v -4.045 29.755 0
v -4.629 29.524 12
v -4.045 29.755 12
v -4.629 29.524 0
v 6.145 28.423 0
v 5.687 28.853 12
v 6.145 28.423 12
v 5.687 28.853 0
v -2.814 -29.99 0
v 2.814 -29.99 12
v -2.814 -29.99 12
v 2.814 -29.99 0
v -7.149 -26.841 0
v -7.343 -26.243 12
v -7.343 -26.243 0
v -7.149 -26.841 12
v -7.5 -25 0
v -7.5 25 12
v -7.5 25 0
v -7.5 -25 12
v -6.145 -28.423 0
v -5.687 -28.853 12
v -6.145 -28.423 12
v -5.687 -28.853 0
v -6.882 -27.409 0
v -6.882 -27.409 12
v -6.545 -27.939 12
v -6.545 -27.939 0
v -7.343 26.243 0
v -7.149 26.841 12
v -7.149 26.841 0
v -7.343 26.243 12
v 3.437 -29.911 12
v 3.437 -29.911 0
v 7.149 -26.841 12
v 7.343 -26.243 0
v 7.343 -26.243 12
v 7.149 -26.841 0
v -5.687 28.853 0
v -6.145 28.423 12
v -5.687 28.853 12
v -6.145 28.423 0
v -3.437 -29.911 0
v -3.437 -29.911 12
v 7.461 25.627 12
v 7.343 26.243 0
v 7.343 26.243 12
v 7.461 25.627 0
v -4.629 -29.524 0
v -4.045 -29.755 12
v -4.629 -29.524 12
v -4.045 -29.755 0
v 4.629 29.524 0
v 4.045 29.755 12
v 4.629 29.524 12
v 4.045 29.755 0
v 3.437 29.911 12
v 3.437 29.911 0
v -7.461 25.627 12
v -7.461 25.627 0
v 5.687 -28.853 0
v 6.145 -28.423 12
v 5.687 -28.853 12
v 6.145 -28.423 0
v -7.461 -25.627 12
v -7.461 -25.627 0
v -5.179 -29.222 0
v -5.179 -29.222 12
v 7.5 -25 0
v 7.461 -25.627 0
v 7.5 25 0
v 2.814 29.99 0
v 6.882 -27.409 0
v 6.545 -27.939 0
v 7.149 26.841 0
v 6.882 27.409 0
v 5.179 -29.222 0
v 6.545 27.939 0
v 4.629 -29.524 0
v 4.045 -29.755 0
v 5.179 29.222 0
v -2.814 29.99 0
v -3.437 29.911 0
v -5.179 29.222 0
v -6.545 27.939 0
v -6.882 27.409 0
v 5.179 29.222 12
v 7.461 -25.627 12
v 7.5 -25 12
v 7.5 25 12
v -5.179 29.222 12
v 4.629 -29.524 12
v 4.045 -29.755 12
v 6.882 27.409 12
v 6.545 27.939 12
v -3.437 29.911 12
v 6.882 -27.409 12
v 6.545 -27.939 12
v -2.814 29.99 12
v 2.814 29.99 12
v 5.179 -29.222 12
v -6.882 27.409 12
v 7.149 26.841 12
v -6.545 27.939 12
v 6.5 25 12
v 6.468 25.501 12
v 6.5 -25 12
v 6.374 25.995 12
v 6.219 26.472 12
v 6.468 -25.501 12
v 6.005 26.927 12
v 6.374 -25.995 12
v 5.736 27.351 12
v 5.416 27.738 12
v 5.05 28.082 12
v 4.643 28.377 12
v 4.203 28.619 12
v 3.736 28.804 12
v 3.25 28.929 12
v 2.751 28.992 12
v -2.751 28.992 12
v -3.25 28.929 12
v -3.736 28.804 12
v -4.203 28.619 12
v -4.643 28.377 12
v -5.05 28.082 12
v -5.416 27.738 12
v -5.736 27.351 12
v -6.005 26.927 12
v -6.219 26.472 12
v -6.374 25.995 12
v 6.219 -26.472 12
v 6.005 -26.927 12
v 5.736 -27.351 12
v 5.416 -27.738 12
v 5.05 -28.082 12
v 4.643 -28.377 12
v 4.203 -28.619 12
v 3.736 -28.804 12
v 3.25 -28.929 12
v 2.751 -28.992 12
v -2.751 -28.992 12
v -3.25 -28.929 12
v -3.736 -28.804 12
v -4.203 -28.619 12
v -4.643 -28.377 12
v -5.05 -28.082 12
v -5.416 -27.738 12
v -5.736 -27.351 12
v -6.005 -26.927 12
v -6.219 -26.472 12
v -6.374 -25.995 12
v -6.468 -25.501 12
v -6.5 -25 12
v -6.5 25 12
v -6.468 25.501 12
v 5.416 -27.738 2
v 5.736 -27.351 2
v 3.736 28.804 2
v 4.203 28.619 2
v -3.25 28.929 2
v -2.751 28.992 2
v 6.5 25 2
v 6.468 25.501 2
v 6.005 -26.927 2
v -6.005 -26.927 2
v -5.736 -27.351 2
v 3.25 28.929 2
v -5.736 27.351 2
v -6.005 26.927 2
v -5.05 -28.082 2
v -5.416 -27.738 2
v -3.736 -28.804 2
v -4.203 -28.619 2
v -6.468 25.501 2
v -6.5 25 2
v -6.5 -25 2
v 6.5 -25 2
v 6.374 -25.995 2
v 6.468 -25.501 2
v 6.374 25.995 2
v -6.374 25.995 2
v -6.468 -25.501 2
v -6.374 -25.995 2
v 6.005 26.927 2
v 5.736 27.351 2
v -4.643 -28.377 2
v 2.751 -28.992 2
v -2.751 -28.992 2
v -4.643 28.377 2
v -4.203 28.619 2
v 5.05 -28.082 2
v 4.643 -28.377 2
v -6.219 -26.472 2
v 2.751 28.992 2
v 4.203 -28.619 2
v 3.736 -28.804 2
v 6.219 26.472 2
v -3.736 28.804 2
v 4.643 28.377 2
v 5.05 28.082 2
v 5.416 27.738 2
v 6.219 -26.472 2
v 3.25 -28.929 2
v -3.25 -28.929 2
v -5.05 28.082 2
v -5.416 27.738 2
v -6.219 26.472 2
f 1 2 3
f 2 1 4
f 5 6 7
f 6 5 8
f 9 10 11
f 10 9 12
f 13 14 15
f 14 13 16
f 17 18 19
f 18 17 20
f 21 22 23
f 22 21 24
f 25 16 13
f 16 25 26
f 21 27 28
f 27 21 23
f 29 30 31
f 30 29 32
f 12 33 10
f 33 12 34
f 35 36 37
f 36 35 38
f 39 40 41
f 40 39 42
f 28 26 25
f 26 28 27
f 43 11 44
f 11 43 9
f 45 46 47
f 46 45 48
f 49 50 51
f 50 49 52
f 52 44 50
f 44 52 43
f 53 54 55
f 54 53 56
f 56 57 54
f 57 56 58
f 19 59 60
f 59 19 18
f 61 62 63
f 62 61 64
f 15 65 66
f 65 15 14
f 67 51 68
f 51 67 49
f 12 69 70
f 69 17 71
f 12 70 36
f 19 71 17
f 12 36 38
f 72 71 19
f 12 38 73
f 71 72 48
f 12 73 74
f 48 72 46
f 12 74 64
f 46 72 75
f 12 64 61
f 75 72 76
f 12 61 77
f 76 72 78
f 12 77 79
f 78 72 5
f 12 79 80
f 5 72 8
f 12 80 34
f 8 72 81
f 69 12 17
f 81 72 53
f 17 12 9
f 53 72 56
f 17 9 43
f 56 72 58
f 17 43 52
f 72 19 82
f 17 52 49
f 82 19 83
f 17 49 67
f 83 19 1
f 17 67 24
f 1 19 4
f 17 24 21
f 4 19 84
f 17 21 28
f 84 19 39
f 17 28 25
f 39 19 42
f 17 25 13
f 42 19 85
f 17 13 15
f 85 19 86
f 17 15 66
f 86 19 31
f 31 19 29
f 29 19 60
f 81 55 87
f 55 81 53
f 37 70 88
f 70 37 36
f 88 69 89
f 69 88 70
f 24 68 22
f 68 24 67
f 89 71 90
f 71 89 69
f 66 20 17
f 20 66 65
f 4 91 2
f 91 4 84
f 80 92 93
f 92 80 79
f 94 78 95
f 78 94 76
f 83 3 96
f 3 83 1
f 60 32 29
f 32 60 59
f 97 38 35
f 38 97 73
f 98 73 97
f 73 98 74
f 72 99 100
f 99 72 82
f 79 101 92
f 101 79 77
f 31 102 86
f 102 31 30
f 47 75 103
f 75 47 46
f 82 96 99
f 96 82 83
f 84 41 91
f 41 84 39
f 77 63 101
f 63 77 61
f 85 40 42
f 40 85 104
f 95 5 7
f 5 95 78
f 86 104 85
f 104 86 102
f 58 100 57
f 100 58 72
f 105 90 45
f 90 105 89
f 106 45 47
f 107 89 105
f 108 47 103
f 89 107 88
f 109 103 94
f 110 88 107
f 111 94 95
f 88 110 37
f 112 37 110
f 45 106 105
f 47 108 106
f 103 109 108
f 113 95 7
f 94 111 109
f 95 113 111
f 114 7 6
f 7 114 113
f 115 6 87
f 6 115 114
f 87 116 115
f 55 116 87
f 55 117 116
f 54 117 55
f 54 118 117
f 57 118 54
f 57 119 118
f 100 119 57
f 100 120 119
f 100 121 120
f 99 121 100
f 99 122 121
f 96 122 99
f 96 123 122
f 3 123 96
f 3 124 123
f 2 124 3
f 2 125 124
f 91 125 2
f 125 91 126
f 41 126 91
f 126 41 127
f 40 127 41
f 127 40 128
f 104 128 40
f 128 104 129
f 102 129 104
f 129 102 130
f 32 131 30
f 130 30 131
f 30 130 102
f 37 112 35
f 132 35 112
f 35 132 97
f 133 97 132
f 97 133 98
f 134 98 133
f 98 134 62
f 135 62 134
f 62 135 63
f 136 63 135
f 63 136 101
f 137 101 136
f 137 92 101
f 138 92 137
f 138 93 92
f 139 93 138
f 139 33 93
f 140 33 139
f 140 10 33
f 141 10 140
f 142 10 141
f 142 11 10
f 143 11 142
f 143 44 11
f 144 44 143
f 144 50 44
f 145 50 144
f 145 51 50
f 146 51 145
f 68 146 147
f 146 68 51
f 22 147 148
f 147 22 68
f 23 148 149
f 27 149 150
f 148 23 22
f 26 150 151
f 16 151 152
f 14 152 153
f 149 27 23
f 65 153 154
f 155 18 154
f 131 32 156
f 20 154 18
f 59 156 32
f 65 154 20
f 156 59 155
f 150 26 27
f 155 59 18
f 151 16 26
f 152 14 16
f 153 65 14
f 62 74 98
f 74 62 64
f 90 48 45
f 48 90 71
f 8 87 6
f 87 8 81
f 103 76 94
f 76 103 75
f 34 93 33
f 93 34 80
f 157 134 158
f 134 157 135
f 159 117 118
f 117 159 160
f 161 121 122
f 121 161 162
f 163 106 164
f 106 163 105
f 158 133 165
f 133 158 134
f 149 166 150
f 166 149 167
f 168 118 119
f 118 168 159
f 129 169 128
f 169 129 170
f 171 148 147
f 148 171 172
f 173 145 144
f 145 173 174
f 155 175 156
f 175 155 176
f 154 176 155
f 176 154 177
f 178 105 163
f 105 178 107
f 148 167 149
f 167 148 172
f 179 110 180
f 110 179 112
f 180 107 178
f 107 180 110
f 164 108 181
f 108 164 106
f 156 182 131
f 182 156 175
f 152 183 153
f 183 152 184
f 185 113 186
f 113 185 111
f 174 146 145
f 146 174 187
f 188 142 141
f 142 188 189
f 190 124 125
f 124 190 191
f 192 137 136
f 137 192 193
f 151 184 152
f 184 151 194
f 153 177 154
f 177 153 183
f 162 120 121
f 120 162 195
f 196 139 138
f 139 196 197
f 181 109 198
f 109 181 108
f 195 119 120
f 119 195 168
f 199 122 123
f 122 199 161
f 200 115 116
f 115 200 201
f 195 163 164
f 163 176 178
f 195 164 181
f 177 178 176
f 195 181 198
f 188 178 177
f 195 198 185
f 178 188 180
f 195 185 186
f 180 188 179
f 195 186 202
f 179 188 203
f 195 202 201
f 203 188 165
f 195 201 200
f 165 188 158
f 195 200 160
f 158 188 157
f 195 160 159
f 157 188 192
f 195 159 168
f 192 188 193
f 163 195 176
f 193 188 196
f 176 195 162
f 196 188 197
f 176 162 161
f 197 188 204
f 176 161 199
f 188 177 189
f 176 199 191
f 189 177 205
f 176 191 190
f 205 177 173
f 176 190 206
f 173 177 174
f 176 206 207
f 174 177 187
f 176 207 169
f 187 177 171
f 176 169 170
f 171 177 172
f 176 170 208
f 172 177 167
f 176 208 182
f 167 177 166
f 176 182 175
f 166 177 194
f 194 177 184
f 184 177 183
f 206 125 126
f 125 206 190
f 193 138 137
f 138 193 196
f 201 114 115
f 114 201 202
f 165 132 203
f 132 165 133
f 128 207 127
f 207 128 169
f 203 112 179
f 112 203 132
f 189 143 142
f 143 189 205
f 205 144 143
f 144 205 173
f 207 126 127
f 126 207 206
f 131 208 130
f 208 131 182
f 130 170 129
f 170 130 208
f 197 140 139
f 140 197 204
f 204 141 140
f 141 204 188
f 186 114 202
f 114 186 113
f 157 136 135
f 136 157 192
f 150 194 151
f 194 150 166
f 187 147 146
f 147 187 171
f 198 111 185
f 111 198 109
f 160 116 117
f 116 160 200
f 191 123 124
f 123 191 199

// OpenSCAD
$fn = 50;


difference() {
	union() {
		hull() {
			translate(v = [-2.5000000000, 25.0000000000, 0]) {
				cylinder(h = 12, r = 5);
			}
			translate(v = [2.5000000000, 25.0000000000, 0]) {
				cylinder(h = 12, r = 5);
			}
			translate(v = [-2.5000000000, -25.0000000000, 0]) {
				cylinder(h = 12, r = 5);
			}
			translate(v = [2.5000000000, -25.0000000000, 0]) {
				cylinder(h = 12, r = 5);
			}
		}
	}
	union() {
		translate(v = [0, 0, 2]) {
			hull() {
				translate(v = [-2.5000000000, 25.0000000000, 0]) {
					cylinder(h = 10, r = 4);
				}
				translate(v = [2.5000000000, 25.0000000000, 0]) {
					cylinder(h = 10, r = 4);
				}
				translate(v = [-2.5000000000, -25.0000000000, 0]) {
					cylinder(h = 10, r = 4);
				}
				translate(v = [2.5000000000, -25.0000000000, 0]) {
					cylinder(h = 10, r = 4);
				}
			}
		}
	}
}
